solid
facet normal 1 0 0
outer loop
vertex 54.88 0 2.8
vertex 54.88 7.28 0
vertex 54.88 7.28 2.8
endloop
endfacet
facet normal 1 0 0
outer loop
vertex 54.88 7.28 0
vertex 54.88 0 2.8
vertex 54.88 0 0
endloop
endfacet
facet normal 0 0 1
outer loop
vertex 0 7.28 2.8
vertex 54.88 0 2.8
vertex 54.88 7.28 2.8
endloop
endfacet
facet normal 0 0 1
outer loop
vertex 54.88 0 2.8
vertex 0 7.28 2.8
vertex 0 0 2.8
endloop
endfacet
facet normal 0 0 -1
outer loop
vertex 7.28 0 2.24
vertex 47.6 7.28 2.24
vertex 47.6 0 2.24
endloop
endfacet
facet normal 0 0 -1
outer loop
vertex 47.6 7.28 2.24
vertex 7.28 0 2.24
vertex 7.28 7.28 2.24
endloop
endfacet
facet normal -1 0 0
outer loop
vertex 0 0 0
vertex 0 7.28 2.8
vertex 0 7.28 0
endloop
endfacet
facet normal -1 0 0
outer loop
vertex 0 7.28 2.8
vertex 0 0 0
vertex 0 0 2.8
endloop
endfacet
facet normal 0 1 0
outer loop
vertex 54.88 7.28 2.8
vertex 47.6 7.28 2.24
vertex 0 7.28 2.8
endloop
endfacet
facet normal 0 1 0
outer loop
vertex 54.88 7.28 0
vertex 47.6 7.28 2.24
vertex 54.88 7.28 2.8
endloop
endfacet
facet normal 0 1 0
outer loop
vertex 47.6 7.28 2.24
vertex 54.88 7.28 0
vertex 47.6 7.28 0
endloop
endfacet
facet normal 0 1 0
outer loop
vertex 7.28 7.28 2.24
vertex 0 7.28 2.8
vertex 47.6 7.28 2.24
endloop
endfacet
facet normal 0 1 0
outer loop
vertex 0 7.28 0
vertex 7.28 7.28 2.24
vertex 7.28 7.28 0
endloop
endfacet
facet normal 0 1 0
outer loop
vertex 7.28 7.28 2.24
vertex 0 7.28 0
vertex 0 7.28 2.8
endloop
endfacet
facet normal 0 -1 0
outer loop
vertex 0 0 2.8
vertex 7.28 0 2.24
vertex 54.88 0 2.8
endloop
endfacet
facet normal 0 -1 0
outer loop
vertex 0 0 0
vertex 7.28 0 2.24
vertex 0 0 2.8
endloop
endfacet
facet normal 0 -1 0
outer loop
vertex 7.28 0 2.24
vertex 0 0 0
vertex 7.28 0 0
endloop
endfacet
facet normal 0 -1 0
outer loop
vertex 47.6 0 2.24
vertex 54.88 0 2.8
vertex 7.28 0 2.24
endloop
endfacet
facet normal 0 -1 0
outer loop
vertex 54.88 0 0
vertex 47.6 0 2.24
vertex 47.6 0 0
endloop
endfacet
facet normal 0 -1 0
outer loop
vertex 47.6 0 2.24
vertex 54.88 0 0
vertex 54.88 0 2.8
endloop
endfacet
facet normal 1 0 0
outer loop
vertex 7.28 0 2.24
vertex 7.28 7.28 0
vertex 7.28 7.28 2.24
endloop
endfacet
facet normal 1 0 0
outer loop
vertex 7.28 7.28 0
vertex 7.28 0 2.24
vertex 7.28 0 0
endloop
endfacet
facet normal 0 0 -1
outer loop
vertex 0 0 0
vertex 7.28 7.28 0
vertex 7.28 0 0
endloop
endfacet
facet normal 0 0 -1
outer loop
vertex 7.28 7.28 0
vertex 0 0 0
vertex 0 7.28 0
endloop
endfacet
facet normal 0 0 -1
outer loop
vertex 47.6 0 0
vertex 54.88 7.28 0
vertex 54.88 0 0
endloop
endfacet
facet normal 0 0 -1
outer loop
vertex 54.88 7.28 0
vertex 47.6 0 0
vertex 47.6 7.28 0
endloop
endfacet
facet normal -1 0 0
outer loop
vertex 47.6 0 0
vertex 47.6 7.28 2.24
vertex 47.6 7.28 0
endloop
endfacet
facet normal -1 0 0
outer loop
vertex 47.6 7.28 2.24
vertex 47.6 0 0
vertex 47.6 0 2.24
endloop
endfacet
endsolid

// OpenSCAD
// file: ../sc.scad
// ShortCuts.scad 
// Autor: Rudolf Huttary, Berlin 2015
//
$fn = 100; 

//show_examples(); 

module show_examples()
	place_in_rect(30, 30)
	{
		Cy(h = 10); 
		CyH(h = 10); 
		CyH(h = 10, w = 30); 
		CyS(h = 10); 
		CyS(h = 10, w1 = 25, w2 = 75); 
		Cu(10); 
		Ri(h = 10); 
		RiH(h = 10); 
		RiS(h = 10, w1 = 10); 
		RiS(h = 10, w1 = 30, w2 = 300); 
		Sp(); 
		SpH(10, 30, 30); 
	}


module help()
{
echo("==============="); 
echo("help(): shows this help"); 
echo("show_examples(): shows some examples"); 
echo("place_in_rect(): places children objects in grid"); 
echo("Transformations:"); 
echo(" transform :  T(x=0, y=0, z=0), Tx(x=0) , Ty(y=0), Tz(z=0)"); 
echo(" rotate :  R(x=0, y=0, z=0), Rx(x=0) , Ry(y=0), Rz(z=0)"); 
echo(" scale :  S(x=1, y=1, z=1), Sx(x=1) , Sy(y=1), Sz(z=1)"); 
echo("Logical"); 
echo(" difference :  D()"); 
echo(" union :  U()"); 
echo(" intersection : *missing*"); 
echo("Primitives"); 
echo(" circle :  Ci(r=10)"); 
echo(" circle_half :  CiH(r=10, w=0)")
echo(" circle_segment :  CiS(r=10, w1=0, w2=90)")
echo(" square :  Sq(x=10, y=0, center=true))"); 
echo(" cylinder :  Cy(r=10, h=1, center=true)"); 
echo(" cylinder_half :  CyH(r=10, w=0)")
echo(" cylinder_segment: CyS(r=10, h=1, w1=0, w2=90,center=true)"); 
echo(" cylinder_segment: Pie(r=10, h=1, w1=0, w2=90,center=true)"); 
echo(" cube :  Cu(x=10, y=0, z=10, center=true)"); 
echo(" ring :  Ri(R=10, r=5, h=1, center=true)"); 
echo(" ring_half :  RiH(R=10, r=5, h=1, w=0 center=true)"); 
echo(" ring_segment :  RiS(R=10, r=5, h=1, w1=0, w2=90, center=true)"); 
echo(" sphere:  Sp(r=10))"); 
echo(" sphere_half:  SpH(r=10, w1 = 0, w2 = 0))"); 
echo("==============="); 
}

// Euclidean Transformations
module T(x=0, y=0, z=0){translate([x, y, z])children(); }
module Tx(x) { translate([x, 0, 0])children(); }
module Ty(y) { translate([0, y, 0])children(); }
module Tz(z) { translate([0, 0, z])children(); }

module R(x=0, y=0, z=0){rotate([x, y, z]) children();}
module Rx(x=90){rotate([x, 0, 0]) children();}
module Ry(y=90){rotate([0, y, 0]) children();}
module Rz(z=90){rotate([0, 0, z]) children();}

module M(x=0, y=0, z=0){mirror([x, y, z]) children();}
module Mx(x=1){mirror([x, 0, 0]) children();}
module My(y=1){mirror([0, y, 0]) children();}
module Mz(z=1){mirror([0, 0, z]) children();}

module S(x=1, y=1, z=1){scale([x, y, z]) children();}
module Sx(x=1){scale([x, 1, 1]) children();}
module Sy(y=1){scale([1, y, 1]) children();}
module Sz(z=1){scale([1, 1, z]) children();}

module D() difference(){children(0); children([1:$children-1]);}
module U() children([0:$children-1]);
// module I() intersection()children([0:$children-1]); // does not work for some reason


// primitives - 2D

module Sq(x =10, y = 0, center = false)
{
   if(y==0)
		square([x, x], center = center); 
	else
		square([x, y], center = center); 
}
module Ci(r = 10)
{
	circle(r = r); 
}

// derived primitives - 2d
module CiH(r = 10, w = 0)
  circle_half(r, w); 

module CiS(r = 10, w1 = 0, w2 = 90)
  circle_segment(r, w1, w2); 


// primitives - 3d
module Cy(r = 10, h = 1, center = false)
{
	cylinder(r = r, h = h, center = center); 
}
module Cu(x = 10, y = 0, z = 10, center = false)
{
  if (y==0)
	cube([x, x, x], center = center); 
  else
	cube([x, y, z], center = center); 
}

// derived primitives - 3d
module CyH(r = 10, h = 1, w = 0, center = false)
  cylinder_half(r, h, w, center); 

module CyS(r = 10, h = 1, w1 = 0, w2 = 90, center = false)
  cylinder_segment(r, h, w1, w2, center); 

module Ri(R = 10, r = 5, h = 1, center = false)
  ring(R, r, h, center); 

module RiS(R = 10, r = 5, h = 1, w1 = 0, w2 = 90, center = false)
   ring_segment(R, r, h, w1, w2, center); 

module RiH(r1 = 10, r2, h = 1, w = 0, center = false)
   ring_half(r1, r2, h, w, center); 
module Pie(r = 10, h = 1, w1 = 0, w2 = 90, center = false)
  cylinder_segment(r, h, w1, w2, center);  
module Sp(r = 10)
  sphere(r); 
module SpH(r = 10, w1 = 0, w2 = 0)
  sphere_half(r, w1, w2); 
module SpS(r = 10, w1 = 0, w2 = 90, w3 = 90)
  sphere_segment(r, w1, w2); 




// clear text definitions
module circle_half(r = 10, w = 0)
{
	difference()
	{
		circle(r); 
     rotate([0, 0, w-90])
     translate([0, -r])
		square([r, 2*r], center = false); 
	}
}

module circle_segment(r = 10, w1 = 0, w2 = 90)
{
  W2 = (w1>w2)?w2+360:w2; 
  if (W2-w1 < 180)
    intersection()
		{
       circle_half(r, w1); 
       circle_half(r, W2-180); 
 		}
	else
    union()
		{
       circle_half(r, w1); 
       circle_half(r, W2-180); 
 		}
}

module cylinder_half(r = 10, h = 1, w = 0, center = true)
{
  linear_extrude(height = h, center = center)
  circle_half(r, w); 
} 

module cylinder_segment(r = 10, h = 1, w1 = 0, w2 = 90, center = true)
{
  linear_extrude(height = h, center = center)
  circle_segment(r, w1, w2); 
} 

module ring(R = 10, r = 5, h = 1, center = true)
{
	difference()
	{
	cylinder(r = R, h = h, center = center); 
   translate([0, 0, -2*h])
	cylinder(r = r, h = 4*h, center = false); 
	}
}

module ring_half(R = 10, r = 5, h = 1, w = 0, center = true)
{
	difference()
	{
		ring(R, r, h, center); 
     rotate([0, 0, w])
     translate([0, -R/2, 0])
		cube([2*R, R, 3*h], center = true); 
	}
}

module ring_segment(R = 10, r = 5, h = 1, w1 = 0, w2 = 90, center = true)
{
  W2 = (w1>w2)?w2+360:w2; 
  if (W2-w1 < 180)
    intersection()
		{
       ring_half(R, r, h, w1, center); 
       ring_half(R, r, h, W2-180, center); 
 		}
	else
    union()
		{
       ring_half(R, r, h, w1, center); 
       ring_half(R, r, h, W2-180, center); 
 		}
}


module sphere_half(r = 10, w1 = 0, w2 = 0)
{  
	difference()
	{
   	sphere(r); 
      rotate([-w1, -w2, 0])
     	translate([0, 0, r])
		cube([2*r, 2*r, r], center = true); 
	}

}


// additional code
module place_in_rect(dx =20, dy=20)
{
  cols = ceil(sqrt($children)); 
  rows = floor(sqrt($children)); 
  for(i = [0:$children-1])
	{ 
	  T(dx*(-cols/2+(i%cols)+.5), dy*(rows/2-floor(i/cols)-.5))
		 children(i); 
	}
}
// main file
use <../lib.scad>
$fn=100;

lineHeight = 0.28;
lineWidth = 0.56;

// Inside measures
width=40; 
length=7;
height=2;
thick=0.2;
thickbottom=lineHeight;
widthbottom=4;
cornerRadius=5;

/**************************/
l = multiple(length,lineWidth); 
w = multiple(width,lineWidth); 
h = multiple(height,lineHeight);
t = multiple(thick,lineWidth);
tb = multiple(thickbottom,lineHeight);
wb = multiple(widthbottom,lineWidth);
cr=cornerRadius;

rotate([0,0,0]){
    
    /* Bridge */
    translate([0,0,h])
    scube(w+l*2,l,lineHeight*2);
    
    scube(l,l,h);
    
    translate([w+l,0,0])
    scube(l,l,h);

}    
